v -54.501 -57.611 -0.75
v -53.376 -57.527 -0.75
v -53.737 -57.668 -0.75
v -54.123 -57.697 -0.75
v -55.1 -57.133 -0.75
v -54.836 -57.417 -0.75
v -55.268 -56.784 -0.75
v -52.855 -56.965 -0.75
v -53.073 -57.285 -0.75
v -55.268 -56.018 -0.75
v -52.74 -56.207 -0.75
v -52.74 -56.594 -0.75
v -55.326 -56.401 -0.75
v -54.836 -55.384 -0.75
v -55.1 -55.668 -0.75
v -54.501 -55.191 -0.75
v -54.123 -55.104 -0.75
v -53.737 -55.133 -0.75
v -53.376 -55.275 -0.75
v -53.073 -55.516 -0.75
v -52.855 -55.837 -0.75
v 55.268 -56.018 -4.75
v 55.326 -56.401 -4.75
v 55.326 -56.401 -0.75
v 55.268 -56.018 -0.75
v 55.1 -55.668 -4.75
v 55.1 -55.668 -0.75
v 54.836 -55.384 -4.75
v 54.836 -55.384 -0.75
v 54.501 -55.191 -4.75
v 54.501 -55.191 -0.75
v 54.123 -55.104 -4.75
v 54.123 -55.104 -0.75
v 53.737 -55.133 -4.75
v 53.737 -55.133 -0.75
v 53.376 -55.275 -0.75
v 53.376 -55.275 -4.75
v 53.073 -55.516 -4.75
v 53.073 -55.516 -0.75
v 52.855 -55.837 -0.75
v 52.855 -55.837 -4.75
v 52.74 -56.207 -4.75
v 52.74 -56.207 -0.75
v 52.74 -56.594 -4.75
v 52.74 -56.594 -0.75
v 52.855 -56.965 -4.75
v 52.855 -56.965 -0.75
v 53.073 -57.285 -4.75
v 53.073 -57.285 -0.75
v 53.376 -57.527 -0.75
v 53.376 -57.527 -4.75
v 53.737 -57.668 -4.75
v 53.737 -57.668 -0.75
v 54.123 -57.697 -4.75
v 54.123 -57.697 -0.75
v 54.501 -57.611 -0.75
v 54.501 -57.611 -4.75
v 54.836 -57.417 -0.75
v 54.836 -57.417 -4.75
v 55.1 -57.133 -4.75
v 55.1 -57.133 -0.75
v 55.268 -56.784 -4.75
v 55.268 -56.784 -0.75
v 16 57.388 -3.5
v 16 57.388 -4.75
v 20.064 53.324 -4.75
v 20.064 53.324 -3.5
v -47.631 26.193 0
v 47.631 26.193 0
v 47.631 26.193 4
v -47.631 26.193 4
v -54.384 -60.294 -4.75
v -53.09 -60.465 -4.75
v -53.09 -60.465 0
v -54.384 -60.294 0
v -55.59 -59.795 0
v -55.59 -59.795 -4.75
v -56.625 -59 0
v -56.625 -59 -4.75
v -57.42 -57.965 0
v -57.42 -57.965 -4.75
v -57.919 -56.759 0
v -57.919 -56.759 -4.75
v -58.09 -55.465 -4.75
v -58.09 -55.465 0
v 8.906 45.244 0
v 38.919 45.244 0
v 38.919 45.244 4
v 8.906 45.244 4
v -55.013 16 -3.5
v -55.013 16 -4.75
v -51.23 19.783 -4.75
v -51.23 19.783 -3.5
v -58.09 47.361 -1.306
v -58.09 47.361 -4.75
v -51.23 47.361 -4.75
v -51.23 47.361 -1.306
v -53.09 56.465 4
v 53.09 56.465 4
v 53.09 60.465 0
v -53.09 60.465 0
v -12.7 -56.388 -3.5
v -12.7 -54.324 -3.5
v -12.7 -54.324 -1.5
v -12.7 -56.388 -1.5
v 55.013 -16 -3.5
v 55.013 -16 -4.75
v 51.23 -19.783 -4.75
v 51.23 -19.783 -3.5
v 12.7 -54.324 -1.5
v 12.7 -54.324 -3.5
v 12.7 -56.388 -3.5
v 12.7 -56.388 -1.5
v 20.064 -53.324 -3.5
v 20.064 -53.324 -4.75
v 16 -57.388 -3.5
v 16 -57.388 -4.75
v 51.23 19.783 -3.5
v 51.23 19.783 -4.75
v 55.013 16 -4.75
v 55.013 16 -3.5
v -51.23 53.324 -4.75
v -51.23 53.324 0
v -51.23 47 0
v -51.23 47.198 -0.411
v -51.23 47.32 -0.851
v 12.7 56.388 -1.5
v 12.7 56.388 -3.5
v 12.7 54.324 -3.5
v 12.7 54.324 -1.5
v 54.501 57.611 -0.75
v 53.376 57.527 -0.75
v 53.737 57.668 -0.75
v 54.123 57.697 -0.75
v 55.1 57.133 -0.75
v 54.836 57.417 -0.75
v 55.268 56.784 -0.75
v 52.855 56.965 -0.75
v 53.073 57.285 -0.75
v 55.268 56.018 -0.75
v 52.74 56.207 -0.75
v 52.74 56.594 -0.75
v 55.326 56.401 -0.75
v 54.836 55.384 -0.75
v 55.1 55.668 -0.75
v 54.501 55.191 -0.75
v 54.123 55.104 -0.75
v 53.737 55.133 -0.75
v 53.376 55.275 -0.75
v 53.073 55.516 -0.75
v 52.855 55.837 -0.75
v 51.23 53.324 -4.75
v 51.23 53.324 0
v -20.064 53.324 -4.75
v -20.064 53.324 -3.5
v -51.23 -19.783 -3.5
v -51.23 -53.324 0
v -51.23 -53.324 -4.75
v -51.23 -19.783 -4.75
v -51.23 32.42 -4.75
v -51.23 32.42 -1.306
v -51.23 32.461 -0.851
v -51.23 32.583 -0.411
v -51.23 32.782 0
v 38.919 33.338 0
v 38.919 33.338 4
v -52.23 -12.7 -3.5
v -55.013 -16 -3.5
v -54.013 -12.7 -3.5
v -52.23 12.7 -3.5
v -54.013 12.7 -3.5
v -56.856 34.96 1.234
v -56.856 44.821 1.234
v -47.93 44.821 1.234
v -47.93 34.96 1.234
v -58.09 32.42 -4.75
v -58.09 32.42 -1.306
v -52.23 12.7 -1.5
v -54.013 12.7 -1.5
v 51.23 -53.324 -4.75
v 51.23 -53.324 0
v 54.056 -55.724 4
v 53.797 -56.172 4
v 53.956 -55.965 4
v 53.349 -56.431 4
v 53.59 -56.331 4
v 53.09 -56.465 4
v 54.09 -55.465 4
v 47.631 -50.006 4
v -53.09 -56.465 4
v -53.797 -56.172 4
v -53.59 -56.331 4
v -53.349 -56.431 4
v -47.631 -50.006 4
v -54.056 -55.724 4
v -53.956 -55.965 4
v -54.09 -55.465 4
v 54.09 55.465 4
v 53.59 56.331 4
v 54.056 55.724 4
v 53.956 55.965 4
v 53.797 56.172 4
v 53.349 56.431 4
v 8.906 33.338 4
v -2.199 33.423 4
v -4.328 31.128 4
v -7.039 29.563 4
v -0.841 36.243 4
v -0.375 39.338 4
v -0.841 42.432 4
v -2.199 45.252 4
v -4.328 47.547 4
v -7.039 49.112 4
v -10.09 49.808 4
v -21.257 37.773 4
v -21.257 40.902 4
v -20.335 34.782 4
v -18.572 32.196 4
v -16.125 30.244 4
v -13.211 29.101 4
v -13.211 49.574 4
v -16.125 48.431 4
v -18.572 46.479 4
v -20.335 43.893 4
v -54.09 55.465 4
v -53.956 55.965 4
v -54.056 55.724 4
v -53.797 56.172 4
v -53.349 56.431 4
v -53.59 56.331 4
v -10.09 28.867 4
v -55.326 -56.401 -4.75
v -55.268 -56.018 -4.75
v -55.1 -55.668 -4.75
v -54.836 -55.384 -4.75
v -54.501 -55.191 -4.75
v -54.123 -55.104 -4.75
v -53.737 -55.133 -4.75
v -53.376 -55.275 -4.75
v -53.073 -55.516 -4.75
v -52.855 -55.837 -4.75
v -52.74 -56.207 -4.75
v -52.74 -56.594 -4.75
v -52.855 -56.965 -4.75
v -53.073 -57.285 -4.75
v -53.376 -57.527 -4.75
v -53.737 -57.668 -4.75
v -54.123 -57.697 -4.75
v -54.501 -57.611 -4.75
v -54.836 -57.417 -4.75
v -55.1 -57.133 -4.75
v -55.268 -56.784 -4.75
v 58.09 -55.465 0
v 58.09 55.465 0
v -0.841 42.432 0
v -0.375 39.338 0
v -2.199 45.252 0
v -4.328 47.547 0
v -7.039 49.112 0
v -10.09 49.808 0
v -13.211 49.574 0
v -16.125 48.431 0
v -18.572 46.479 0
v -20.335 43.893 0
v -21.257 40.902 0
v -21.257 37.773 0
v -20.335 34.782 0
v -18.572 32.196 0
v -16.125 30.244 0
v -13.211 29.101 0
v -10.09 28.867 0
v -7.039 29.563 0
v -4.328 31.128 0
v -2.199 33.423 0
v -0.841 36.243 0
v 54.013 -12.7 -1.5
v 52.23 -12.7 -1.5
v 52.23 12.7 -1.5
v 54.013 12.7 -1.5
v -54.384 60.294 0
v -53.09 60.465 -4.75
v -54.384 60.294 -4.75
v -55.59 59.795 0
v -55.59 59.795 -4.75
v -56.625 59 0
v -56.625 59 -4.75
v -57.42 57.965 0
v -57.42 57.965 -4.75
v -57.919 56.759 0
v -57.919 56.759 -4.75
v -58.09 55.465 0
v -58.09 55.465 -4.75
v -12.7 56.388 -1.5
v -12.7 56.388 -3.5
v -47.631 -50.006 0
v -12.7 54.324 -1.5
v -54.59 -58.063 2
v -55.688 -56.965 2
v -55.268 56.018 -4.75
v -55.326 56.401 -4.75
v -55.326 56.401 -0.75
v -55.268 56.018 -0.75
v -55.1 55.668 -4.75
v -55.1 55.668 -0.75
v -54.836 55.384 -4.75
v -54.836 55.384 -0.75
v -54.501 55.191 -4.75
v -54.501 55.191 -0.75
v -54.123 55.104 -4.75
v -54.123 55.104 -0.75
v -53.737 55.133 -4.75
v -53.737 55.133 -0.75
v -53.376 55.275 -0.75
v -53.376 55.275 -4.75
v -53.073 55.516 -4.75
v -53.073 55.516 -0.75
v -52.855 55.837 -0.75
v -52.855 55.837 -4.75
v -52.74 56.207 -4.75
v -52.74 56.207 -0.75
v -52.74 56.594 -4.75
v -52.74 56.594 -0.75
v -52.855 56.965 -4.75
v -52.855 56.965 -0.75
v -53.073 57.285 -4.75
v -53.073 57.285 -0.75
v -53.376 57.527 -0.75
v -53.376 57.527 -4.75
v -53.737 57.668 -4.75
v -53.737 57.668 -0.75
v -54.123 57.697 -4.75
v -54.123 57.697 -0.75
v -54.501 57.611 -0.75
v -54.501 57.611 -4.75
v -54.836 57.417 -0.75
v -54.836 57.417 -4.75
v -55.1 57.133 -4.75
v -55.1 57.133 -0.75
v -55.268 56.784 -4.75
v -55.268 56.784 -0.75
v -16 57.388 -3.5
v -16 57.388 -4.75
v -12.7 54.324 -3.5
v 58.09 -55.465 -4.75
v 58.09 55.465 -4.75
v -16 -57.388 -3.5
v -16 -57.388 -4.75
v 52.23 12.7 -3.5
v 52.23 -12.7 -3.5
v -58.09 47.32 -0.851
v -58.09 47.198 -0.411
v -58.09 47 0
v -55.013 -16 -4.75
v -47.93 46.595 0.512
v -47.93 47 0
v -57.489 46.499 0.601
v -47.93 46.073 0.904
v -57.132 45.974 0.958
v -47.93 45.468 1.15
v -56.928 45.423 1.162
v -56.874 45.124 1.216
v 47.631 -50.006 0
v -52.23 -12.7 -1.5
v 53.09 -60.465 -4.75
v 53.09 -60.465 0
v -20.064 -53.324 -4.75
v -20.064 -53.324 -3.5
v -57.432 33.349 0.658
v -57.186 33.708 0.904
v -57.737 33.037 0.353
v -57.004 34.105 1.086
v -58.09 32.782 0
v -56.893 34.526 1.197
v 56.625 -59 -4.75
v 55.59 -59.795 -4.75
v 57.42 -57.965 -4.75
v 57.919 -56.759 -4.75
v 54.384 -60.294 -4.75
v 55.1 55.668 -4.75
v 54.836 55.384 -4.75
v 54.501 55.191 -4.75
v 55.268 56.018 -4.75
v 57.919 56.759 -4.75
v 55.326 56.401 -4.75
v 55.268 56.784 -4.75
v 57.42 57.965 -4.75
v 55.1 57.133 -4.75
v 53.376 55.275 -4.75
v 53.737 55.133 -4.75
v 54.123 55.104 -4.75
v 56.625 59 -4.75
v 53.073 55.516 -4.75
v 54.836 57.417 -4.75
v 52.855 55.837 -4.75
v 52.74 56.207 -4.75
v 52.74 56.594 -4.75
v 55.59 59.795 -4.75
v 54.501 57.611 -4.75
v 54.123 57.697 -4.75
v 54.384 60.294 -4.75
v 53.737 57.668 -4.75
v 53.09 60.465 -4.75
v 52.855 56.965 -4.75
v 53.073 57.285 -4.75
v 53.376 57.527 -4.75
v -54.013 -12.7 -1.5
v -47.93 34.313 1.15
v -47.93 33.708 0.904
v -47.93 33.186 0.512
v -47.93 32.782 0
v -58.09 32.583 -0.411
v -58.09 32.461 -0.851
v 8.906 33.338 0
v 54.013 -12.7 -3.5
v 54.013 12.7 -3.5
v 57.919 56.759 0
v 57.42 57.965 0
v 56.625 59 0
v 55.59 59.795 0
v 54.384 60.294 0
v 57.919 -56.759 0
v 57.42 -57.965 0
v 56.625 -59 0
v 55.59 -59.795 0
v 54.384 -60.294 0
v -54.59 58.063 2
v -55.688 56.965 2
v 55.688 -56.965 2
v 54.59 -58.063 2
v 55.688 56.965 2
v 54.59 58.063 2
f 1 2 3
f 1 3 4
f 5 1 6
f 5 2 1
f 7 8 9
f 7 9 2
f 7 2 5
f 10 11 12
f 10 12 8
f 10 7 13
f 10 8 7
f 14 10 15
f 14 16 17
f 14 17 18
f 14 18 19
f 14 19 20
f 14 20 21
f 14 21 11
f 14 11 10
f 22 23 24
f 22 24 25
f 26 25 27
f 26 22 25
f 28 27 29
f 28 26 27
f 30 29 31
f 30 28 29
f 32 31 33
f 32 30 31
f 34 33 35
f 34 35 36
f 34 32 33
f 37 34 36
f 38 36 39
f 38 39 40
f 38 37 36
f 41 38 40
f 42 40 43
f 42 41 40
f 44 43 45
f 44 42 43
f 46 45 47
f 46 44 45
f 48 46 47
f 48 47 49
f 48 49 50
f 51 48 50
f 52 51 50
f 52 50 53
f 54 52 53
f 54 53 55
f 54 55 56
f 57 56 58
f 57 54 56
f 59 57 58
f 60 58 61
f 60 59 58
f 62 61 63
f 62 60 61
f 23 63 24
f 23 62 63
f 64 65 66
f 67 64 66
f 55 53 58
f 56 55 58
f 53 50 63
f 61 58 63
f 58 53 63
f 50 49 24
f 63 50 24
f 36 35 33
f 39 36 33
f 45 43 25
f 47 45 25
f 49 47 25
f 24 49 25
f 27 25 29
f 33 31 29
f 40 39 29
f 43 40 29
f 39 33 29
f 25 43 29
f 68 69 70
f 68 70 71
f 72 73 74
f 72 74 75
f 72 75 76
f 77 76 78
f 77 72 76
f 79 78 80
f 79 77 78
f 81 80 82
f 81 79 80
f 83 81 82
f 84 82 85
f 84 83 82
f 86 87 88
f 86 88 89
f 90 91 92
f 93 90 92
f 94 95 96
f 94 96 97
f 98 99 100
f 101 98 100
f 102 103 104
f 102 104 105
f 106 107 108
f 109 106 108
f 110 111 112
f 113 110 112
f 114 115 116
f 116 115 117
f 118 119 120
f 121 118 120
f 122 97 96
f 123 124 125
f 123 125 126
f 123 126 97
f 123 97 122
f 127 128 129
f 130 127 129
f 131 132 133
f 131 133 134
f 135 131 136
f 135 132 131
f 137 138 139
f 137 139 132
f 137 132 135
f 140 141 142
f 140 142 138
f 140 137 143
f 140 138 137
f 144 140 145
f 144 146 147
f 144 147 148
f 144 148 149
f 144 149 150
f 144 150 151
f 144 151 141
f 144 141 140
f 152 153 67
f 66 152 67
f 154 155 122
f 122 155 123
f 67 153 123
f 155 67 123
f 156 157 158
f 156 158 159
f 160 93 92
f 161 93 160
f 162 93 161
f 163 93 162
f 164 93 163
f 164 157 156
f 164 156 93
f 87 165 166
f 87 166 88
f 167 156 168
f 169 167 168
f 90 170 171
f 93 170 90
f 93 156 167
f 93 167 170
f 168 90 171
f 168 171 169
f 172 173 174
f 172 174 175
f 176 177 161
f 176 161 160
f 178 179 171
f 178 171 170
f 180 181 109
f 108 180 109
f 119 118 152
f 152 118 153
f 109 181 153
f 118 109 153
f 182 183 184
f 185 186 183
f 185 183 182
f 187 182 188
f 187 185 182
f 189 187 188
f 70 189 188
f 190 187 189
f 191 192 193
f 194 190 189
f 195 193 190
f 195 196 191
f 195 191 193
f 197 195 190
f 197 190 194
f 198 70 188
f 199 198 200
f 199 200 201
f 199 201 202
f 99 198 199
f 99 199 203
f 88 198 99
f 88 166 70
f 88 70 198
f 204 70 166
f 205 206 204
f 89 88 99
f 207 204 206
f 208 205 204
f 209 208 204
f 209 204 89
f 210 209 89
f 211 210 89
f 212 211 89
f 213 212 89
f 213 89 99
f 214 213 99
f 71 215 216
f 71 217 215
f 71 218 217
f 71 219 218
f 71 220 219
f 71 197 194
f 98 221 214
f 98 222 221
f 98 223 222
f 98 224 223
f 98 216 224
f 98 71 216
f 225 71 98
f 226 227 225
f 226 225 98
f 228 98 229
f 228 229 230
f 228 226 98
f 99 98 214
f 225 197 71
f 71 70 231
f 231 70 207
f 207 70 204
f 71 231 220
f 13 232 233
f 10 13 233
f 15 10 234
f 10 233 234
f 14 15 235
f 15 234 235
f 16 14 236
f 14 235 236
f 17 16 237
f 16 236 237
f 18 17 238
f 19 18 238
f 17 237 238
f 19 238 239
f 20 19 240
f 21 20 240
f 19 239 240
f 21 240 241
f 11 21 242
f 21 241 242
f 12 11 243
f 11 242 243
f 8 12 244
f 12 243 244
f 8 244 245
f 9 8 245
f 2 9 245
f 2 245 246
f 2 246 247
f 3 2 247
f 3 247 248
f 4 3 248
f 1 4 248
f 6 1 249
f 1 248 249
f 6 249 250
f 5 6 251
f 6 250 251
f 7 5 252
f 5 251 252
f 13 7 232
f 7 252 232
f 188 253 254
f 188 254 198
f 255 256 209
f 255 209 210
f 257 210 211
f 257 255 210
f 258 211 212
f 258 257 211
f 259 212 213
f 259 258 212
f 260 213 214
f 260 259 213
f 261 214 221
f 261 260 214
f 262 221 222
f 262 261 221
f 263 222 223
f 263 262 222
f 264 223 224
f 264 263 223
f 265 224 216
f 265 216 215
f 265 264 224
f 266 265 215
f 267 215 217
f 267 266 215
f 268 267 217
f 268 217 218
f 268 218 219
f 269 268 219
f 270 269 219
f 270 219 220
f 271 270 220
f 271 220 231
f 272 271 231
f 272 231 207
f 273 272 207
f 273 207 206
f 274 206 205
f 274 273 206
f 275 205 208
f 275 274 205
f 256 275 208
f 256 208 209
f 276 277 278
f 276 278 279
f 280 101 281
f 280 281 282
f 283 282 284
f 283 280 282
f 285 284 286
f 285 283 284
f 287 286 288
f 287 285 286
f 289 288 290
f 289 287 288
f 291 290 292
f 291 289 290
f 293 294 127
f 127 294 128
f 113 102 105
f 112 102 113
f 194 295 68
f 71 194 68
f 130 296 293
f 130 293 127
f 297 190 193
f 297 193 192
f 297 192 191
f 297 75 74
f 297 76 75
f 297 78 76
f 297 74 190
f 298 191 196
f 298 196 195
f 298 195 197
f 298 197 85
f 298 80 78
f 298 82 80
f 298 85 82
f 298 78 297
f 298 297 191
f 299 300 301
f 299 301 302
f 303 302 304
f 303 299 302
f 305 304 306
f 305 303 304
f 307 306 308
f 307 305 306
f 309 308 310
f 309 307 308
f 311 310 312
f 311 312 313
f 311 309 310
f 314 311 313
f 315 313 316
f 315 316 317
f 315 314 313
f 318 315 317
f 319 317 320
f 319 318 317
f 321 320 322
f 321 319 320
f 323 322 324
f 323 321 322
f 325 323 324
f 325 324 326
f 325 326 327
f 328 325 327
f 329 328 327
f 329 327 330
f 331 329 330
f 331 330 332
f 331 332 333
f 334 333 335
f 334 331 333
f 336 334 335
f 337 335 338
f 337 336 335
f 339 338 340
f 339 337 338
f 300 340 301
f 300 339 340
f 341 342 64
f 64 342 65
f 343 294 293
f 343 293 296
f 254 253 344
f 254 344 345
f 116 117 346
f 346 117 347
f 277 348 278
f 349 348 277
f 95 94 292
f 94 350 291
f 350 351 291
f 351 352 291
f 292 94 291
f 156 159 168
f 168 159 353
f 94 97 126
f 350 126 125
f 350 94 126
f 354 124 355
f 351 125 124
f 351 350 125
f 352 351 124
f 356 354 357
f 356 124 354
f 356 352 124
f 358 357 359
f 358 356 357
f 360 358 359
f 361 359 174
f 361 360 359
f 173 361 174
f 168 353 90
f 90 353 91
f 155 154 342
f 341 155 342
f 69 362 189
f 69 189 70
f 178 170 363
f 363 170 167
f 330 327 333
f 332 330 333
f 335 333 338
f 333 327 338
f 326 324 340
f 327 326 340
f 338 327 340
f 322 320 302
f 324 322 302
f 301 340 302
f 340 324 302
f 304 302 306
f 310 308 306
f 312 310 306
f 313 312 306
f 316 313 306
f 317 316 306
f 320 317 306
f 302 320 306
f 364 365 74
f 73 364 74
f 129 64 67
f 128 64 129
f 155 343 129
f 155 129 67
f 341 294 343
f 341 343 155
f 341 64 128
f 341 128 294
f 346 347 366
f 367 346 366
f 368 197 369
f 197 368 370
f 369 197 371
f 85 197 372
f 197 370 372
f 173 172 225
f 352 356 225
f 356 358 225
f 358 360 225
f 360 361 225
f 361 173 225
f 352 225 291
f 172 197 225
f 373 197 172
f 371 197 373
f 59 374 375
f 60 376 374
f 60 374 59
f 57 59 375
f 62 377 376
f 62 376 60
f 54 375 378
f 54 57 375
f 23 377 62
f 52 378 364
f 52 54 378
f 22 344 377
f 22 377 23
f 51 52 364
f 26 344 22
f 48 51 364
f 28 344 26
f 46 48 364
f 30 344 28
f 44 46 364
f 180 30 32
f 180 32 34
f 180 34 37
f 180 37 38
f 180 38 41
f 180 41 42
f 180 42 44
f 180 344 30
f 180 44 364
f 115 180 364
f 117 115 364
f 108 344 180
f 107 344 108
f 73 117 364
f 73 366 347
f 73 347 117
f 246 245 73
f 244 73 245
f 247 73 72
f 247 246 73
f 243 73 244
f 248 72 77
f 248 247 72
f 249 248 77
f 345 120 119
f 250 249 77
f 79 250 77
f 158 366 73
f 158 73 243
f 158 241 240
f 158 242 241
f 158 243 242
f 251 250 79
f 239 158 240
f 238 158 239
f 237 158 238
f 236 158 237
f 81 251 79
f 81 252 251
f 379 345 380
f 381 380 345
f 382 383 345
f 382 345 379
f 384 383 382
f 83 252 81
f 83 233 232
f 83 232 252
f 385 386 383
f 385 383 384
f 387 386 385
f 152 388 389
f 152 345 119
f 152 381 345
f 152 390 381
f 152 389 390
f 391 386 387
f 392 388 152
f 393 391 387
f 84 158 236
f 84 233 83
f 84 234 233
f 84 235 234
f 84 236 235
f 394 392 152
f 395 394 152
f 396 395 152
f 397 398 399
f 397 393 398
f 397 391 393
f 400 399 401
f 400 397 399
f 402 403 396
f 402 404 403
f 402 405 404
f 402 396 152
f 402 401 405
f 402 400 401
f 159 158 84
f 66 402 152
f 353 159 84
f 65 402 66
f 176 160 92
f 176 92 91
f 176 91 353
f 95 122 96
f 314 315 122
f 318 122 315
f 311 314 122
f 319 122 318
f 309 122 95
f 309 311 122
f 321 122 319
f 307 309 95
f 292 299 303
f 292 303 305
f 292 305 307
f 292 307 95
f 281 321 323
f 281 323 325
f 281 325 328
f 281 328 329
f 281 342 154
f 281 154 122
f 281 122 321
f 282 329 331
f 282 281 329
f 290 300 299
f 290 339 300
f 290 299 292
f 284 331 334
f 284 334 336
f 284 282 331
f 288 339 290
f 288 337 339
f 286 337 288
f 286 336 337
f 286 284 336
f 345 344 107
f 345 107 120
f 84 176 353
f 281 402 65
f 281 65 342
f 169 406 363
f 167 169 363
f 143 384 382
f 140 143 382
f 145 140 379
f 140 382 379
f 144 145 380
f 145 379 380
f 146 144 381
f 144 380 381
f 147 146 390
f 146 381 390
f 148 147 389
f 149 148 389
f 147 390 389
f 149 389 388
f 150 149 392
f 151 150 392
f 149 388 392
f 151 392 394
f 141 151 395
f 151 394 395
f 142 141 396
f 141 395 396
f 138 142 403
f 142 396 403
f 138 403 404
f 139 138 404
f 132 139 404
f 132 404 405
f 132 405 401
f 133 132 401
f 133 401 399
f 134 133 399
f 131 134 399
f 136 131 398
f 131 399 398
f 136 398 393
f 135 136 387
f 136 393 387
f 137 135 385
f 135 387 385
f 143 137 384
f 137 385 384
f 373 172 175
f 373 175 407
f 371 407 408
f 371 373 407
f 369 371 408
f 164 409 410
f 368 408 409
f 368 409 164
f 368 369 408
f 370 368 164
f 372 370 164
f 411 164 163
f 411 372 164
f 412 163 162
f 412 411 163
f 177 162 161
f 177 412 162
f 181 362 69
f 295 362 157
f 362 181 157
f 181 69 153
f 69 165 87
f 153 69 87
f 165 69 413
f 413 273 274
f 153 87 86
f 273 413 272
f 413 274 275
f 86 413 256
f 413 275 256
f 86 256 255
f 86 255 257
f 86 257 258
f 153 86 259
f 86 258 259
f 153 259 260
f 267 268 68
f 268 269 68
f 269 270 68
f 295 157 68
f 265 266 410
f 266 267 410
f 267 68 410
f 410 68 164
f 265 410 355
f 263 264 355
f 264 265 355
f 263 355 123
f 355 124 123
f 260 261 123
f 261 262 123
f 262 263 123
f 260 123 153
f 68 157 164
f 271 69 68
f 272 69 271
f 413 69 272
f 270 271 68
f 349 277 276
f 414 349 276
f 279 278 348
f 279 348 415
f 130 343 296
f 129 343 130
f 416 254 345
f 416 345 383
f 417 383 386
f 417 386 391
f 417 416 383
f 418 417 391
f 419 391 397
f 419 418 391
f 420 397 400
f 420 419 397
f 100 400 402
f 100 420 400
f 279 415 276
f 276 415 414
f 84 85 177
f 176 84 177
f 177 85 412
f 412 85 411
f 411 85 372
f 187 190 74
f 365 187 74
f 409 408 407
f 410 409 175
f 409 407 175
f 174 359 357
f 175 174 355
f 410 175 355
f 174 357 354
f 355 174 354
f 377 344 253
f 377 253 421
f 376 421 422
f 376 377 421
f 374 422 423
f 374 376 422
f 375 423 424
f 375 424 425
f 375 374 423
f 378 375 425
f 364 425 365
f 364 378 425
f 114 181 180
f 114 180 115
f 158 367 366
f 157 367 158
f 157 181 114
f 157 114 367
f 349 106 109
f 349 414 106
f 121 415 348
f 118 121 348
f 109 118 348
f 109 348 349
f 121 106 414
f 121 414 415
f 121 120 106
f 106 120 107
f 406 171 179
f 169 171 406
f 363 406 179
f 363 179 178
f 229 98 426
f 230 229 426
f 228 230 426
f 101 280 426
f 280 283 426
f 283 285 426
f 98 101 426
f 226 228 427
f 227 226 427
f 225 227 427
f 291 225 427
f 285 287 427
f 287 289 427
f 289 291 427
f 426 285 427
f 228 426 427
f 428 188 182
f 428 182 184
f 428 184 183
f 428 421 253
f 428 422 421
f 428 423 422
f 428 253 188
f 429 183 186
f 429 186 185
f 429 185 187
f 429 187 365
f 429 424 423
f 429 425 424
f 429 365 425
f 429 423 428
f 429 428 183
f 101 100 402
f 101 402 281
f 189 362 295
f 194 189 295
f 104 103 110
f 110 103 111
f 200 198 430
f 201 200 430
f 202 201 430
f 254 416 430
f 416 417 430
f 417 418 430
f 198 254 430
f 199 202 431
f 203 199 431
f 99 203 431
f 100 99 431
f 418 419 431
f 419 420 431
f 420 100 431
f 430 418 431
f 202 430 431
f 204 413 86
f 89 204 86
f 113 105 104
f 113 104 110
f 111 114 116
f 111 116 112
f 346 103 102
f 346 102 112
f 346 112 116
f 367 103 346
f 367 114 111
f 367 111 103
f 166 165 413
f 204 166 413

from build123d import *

# Parameters (mm, degrees)
SKETCH1_W                                  = 120.9294
SKETCH1_H                                  = 116.1796
SKETCH1_R                                  = 10.5
SKETCH1_W_2                                = 11.906
SKETCH1_H_2                                = 30.0122
SKETCH1_W_3                                = 76.19975
SKETCH1_H_3                                = 95.2627
BOSS_EXTRUDE1_DEPTH                        = 4
SKETCH2_W                                  = 116.1796
SKETCH2_H                                  = 120.9294
SKETCH2_W_2                                = 102.459137156
SKETCH2_H_2                                = 106.648
BOSS_EXTRUDE2_DEPTH                        = 4.75
CUT_EXTRUDE1_DEPTH                         = 1.25
SKETCH6_W                                  = 25.4
SKETCH6_H                                  = 2.0635
SKETCH6_W_2                                = 1.783031422
SKETCH6_H_2                                = 25.4
CUT_EXTRUDE2_DEPTH                         = 2
CUT_EXTRUDE3_DEPTH                         = 10.16
SKETCH8_R                                  = 1.3
CUT_EXTRUDE4_DEPTH                         = 4
MIRROR1_AT_THE_SECOND_PLANE_COPY_1_SKETC_R = 1.3
MIRROR1_AT_THE_SECOND_PLANE_COPY_1_DEPTH   = 4
FILLET1_R                                  = 5
CHAMFER1_SIZE                              = 4


with BuildPart() as part:
    # Sketch1 → Boss-Extrude1 (new body)
    with BuildSketch(Plane(origin=(0, 0, 0), x_dir=(0, 1, 0), z_dir=(0, 0, 1))):
        Rectangle(SKETCH1_W, SKETCH1_H)
        with Locations(Location((39.3375, 10.8746, 0), (0, 0, 270))):
            Circle(SKETCH1_R, mode=Mode.SUBTRACT)
        with Locations((39.2905, -23.9125)):
            Rectangle(SKETCH1_W_2, SKETCH1_H_2, mode=Mode.SUBTRACT)
        with Locations((-11.906375, 0)):
            Rectangle(SKETCH1_W_3, SKETCH1_H_3, mode=Mode.SUBTRACT)
    extrude(amount=BOSS_EXTRUDE1_DEPTH)

    # Sketch2 → Boss-Extrude2 (add)
    with BuildSketch(Plane(origin=(0, 0, 0), x_dir=(-1, 0, 0), z_dir=(0, 0, -1))):
        Rectangle(SKETCH2_W, SKETCH2_H)
        Rectangle(SKETCH2_W_2, SKETCH2_H_2, mode=Mode.SUBTRACT)
    extrude(amount=BOSS_EXTRUDE2_DEPTH)

    # Sketch4 → Cut-Extrude1 (cut)
    with BuildSketch(Plane(origin=(0, 0, -4.75), x_dir=(-1, 0, 0), z_dir=(0, 0, -1))):
        Polygon((-50.0126, -52.3875), (-21, -52.3875), (-16, -57.3875), (16, -57.3875), (21, -52.3875), (50.0126, -52.3875), (50.0126, -21), (55.0126, -16), (55.0126, 16), (50.0126, 21), (50.0126, 52.3875), (21, 52.3875), (16, 57.3875), (-16, 57.3875), (-21, 52.3875), (-50.0126, 52.3875), (-50.0126, 21), (-55.0126, 16), (-55.0126, -16), (-50.0126, -21), align=None)
    extrude(amount=-CUT_EXTRUDE1_DEPTH, mode=Mode.SUBTRACT)

    # Sketch6 → Cut-Extrude2 (cut)
    with BuildSketch(Plane(origin=(0, 0, -3.5), x_dir=(1, 0, 0), z_dir=(0, 0, -1))):
        with Locations((0, 55.35575)):
            Rectangle(SKETCH6_W, SKETCH6_H)
        with Locations((0, -55.35575)):
            Rectangle(SKETCH6_W, SKETCH6_H)
        with Locations((-53.121084289, 0)):
            Rectangle(SKETCH6_W_2, SKETCH6_H_2)
        with Locations((53.121084289, 0)):
            Rectangle(SKETCH6_W_2, SKETCH6_H_2)
    extrude(amount=-CUT_EXTRUDE2_DEPTH, mode=Mode.SUBTRACT)

    # Sketch7 → Cut-Extrude3 (cut)
    with BuildSketch(Plane(origin=(-58.0898, 0, 0), x_dir=(0, -1, 0), z_dir=(-1, 0, 0))):
        with BuildLine():
            Line((-44.8211, 1.2342), (-34.9603, 1.2342))
            ThreePointArc((-34.9603, 1.2342), (-33.164248776, 0.490251224), (-32.4203, -1.3058))
            Line((-32.4203, -1.3058), (-32.4203, -5.3754))
            ThreePointArc((-32.4203, -5.3754), (-33.164248776, -7.171451224), (-34.9603, -7.9154))
            Line((-34.9603, -7.9154), (-44.8211, -7.9154))
            ThreePointArc((-44.8211, -7.9154), (-46.617151224, -7.171451224), (-47.3611, -5.3754))
            Line((-47.3611, -5.3754), (-47.3611, -1.3058))
            ThreePointArc((-47.3611, -1.3058), (-46.617151224, 0.490251224), (-44.8211, 1.2342))
        make_face()
    extrude(amount=-CUT_EXTRUDE3_DEPTH, mode=Mode.SUBTRACT)

    # Sketch8 → Cut-Extrude4 (cut)
    with BuildSketch(Plane(origin=(0, 0, -4.75), x_dir=(1, 0, 0), z_dir=(0, 0, -1))):
        with Locations(Location((-54.0258, 56.4007, 0), (0, 0, 180))):
            Circle(SKETCH8_R)
    cut_extrude4 = extrude(amount=-CUT_EXTRUDE4_DEPTH, mode=Mode.SUBTRACT)

    # Mirror1: Cut-Extrude4 across plane
    add(cut_extrude4.mirror(Plane(origin=(0, 0, 0), x_dir=(0, 0, 1), z_dir=(1, 0, 0))), mode=Mode.SUBTRACT)

    # Mirror1 at the second plane: Cut-Extrude4 across plane
    add(cut_extrude4.mirror(Plane.ZX), mode=Mode.SUBTRACT)

    # Mirror1 at the second plane copy 1 sketc → Mirror1 at the second plane copy 1 (cut)
    with BuildSketch(Plane(origin=(0, 0, -4.75), x_dir=(-1, 0, 0), z_dir=(0, 0, -1))):
        with Locations(Location((-54.0258, 56.4007, 0), (0, 0, 180))):
            Circle(MIRROR1_AT_THE_SECOND_PLANE_COPY_1_SKETC_R)
    extrude(amount=-MIRROR1_AT_THE_SECOND_PLANE_COPY_1_DEPTH, mode=Mode.SUBTRACT)

    # Fillet1
    fillet1_edges = [part.edges().sort_by_distance(p)[0] for p in [
        (58.0898, 60.4647, -0.375),
        (58.0898, -60.4647, -0.375),
        (-58.0898, -60.4647, -0.375),
        (-58.0898, 60.4647, -0.375),
    ]]
    fillet(fillet1_edges, radius=FILLET1_R)

    # Chamfer1
    # the kernel refuses this chamfer: 4 mm, written as the material it takes off along each edge
    with BuildSketch(Plane(origin=(-53.0898, -60.4647, 4), x_dir=(0, 0.9996219169112968, 0.027495876610586296), z_dir=(1, 0, 0)), Plane(origin=(53.0898, 60.4647, 4), x_dir=(0, -0.9996219169112968, 0.027495876610586296), z_dir=(-1, 0, 0))) as chamfer1_piece_1:
        Polygon((CHAMFER1_SIZE * 0.999621916911, -CHAMFER1_SIZE * 0.0274958766106), (-CHAMFER1_SIZE * 0.0274958766106, -CHAMFER1_SIZE * 0.999621916911), (0, 0), align=None)
    extrude(amount=106.1796, mode=Mode.SUBTRACT)
    with BuildSketch(Plane(origin=(58.0898, -55.4647, 4), x_dir=(0.02749587661058563, 0, -0.9996219169112968), z_dir=(0, 1, 0))) as chamfer1_piece_2:
        Polygon((CHAMFER1_SIZE * 0.999621916911, CHAMFER1_SIZE * 0.0274958766106), (-CHAMFER1_SIZE * 0.0274958766106, CHAMFER1_SIZE * 0.999621916911), (0, 0), align=None)
    extrude(amount=110.9294, mode=Mode.SUBTRACT)
    with BuildSketch(Plane(origin=(-58.0898, 55.4647, 4), x_dir=(0.9996219169112968, 0, 0.027495876610586296), z_dir=(0, -1, 0))) as chamfer1_piece_3:
        Polygon((CHAMFER1_SIZE * 0.999621916911, -CHAMFER1_SIZE * 0.0274958766106), (-CHAMFER1_SIZE * 0.0274958766106, -CHAMFER1_SIZE * 0.999621916911), (0, 0), align=None)
    extrude(amount=110.9294, mode=Mode.SUBTRACT)
    with BuildSketch(Plane(origin=(53.0898, 55.4647, 4), x_dir=(1, 0, 0), z_dir=(0, -1, 0))) as chamfer1_piece_4:
        Polygon((5 - CHAMFER1_SIZE, 0), (5, -CHAMFER1_SIZE), (5, 0), align=None)
    revolve(axis=Axis((53.0898, 55.4647, 4), (0, 0, 1)), revolution_arc=90, mode=Mode.SUBTRACT)
    with BuildSketch(Plane(origin=(53.0898, -55.4647, 4), x_dir=(1, 0, 0), z_dir=(0, 1, 0))) as chamfer1_piece_5:
        Polygon((5 - CHAMFER1_SIZE, 0), (5, CHAMFER1_SIZE), (5, 0), align=None)
    revolve(axis=Axis((53.0898, -55.4647, 4), (0, 0, -1)), revolution_arc=90, mode=Mode.SUBTRACT)
    with BuildSketch(Plane(origin=(-53.0898, 55.4647, 4), x_dir=(0, 1, 0), z_dir=(1, 0, 0))) as chamfer1_piece_6:
        Polygon((5 - CHAMFER1_SIZE, 0), (5, -CHAMFER1_SIZE), (5, 0), align=None)
    revolve(axis=Axis((-53.0898, 55.4647, 4), (0, 0, 1)), revolution_arc=90, mode=Mode.SUBTRACT)
    with BuildSketch(Plane(origin=(-53.0898, -55.4647, 4), x_dir=(0, -1, 0), z_dir=(1, 0, 0))) as chamfer1_piece_7:
        Polygon((5 - CHAMFER1_SIZE, 0), (5, CHAMFER1_SIZE), (5, 0), align=None)
    revolve(axis=Axis((-53.0898, -55.4647, 4), (0, 0, -1)), revolution_arc=90, mode=Mode.SUBTRACT)


solid = part.part
